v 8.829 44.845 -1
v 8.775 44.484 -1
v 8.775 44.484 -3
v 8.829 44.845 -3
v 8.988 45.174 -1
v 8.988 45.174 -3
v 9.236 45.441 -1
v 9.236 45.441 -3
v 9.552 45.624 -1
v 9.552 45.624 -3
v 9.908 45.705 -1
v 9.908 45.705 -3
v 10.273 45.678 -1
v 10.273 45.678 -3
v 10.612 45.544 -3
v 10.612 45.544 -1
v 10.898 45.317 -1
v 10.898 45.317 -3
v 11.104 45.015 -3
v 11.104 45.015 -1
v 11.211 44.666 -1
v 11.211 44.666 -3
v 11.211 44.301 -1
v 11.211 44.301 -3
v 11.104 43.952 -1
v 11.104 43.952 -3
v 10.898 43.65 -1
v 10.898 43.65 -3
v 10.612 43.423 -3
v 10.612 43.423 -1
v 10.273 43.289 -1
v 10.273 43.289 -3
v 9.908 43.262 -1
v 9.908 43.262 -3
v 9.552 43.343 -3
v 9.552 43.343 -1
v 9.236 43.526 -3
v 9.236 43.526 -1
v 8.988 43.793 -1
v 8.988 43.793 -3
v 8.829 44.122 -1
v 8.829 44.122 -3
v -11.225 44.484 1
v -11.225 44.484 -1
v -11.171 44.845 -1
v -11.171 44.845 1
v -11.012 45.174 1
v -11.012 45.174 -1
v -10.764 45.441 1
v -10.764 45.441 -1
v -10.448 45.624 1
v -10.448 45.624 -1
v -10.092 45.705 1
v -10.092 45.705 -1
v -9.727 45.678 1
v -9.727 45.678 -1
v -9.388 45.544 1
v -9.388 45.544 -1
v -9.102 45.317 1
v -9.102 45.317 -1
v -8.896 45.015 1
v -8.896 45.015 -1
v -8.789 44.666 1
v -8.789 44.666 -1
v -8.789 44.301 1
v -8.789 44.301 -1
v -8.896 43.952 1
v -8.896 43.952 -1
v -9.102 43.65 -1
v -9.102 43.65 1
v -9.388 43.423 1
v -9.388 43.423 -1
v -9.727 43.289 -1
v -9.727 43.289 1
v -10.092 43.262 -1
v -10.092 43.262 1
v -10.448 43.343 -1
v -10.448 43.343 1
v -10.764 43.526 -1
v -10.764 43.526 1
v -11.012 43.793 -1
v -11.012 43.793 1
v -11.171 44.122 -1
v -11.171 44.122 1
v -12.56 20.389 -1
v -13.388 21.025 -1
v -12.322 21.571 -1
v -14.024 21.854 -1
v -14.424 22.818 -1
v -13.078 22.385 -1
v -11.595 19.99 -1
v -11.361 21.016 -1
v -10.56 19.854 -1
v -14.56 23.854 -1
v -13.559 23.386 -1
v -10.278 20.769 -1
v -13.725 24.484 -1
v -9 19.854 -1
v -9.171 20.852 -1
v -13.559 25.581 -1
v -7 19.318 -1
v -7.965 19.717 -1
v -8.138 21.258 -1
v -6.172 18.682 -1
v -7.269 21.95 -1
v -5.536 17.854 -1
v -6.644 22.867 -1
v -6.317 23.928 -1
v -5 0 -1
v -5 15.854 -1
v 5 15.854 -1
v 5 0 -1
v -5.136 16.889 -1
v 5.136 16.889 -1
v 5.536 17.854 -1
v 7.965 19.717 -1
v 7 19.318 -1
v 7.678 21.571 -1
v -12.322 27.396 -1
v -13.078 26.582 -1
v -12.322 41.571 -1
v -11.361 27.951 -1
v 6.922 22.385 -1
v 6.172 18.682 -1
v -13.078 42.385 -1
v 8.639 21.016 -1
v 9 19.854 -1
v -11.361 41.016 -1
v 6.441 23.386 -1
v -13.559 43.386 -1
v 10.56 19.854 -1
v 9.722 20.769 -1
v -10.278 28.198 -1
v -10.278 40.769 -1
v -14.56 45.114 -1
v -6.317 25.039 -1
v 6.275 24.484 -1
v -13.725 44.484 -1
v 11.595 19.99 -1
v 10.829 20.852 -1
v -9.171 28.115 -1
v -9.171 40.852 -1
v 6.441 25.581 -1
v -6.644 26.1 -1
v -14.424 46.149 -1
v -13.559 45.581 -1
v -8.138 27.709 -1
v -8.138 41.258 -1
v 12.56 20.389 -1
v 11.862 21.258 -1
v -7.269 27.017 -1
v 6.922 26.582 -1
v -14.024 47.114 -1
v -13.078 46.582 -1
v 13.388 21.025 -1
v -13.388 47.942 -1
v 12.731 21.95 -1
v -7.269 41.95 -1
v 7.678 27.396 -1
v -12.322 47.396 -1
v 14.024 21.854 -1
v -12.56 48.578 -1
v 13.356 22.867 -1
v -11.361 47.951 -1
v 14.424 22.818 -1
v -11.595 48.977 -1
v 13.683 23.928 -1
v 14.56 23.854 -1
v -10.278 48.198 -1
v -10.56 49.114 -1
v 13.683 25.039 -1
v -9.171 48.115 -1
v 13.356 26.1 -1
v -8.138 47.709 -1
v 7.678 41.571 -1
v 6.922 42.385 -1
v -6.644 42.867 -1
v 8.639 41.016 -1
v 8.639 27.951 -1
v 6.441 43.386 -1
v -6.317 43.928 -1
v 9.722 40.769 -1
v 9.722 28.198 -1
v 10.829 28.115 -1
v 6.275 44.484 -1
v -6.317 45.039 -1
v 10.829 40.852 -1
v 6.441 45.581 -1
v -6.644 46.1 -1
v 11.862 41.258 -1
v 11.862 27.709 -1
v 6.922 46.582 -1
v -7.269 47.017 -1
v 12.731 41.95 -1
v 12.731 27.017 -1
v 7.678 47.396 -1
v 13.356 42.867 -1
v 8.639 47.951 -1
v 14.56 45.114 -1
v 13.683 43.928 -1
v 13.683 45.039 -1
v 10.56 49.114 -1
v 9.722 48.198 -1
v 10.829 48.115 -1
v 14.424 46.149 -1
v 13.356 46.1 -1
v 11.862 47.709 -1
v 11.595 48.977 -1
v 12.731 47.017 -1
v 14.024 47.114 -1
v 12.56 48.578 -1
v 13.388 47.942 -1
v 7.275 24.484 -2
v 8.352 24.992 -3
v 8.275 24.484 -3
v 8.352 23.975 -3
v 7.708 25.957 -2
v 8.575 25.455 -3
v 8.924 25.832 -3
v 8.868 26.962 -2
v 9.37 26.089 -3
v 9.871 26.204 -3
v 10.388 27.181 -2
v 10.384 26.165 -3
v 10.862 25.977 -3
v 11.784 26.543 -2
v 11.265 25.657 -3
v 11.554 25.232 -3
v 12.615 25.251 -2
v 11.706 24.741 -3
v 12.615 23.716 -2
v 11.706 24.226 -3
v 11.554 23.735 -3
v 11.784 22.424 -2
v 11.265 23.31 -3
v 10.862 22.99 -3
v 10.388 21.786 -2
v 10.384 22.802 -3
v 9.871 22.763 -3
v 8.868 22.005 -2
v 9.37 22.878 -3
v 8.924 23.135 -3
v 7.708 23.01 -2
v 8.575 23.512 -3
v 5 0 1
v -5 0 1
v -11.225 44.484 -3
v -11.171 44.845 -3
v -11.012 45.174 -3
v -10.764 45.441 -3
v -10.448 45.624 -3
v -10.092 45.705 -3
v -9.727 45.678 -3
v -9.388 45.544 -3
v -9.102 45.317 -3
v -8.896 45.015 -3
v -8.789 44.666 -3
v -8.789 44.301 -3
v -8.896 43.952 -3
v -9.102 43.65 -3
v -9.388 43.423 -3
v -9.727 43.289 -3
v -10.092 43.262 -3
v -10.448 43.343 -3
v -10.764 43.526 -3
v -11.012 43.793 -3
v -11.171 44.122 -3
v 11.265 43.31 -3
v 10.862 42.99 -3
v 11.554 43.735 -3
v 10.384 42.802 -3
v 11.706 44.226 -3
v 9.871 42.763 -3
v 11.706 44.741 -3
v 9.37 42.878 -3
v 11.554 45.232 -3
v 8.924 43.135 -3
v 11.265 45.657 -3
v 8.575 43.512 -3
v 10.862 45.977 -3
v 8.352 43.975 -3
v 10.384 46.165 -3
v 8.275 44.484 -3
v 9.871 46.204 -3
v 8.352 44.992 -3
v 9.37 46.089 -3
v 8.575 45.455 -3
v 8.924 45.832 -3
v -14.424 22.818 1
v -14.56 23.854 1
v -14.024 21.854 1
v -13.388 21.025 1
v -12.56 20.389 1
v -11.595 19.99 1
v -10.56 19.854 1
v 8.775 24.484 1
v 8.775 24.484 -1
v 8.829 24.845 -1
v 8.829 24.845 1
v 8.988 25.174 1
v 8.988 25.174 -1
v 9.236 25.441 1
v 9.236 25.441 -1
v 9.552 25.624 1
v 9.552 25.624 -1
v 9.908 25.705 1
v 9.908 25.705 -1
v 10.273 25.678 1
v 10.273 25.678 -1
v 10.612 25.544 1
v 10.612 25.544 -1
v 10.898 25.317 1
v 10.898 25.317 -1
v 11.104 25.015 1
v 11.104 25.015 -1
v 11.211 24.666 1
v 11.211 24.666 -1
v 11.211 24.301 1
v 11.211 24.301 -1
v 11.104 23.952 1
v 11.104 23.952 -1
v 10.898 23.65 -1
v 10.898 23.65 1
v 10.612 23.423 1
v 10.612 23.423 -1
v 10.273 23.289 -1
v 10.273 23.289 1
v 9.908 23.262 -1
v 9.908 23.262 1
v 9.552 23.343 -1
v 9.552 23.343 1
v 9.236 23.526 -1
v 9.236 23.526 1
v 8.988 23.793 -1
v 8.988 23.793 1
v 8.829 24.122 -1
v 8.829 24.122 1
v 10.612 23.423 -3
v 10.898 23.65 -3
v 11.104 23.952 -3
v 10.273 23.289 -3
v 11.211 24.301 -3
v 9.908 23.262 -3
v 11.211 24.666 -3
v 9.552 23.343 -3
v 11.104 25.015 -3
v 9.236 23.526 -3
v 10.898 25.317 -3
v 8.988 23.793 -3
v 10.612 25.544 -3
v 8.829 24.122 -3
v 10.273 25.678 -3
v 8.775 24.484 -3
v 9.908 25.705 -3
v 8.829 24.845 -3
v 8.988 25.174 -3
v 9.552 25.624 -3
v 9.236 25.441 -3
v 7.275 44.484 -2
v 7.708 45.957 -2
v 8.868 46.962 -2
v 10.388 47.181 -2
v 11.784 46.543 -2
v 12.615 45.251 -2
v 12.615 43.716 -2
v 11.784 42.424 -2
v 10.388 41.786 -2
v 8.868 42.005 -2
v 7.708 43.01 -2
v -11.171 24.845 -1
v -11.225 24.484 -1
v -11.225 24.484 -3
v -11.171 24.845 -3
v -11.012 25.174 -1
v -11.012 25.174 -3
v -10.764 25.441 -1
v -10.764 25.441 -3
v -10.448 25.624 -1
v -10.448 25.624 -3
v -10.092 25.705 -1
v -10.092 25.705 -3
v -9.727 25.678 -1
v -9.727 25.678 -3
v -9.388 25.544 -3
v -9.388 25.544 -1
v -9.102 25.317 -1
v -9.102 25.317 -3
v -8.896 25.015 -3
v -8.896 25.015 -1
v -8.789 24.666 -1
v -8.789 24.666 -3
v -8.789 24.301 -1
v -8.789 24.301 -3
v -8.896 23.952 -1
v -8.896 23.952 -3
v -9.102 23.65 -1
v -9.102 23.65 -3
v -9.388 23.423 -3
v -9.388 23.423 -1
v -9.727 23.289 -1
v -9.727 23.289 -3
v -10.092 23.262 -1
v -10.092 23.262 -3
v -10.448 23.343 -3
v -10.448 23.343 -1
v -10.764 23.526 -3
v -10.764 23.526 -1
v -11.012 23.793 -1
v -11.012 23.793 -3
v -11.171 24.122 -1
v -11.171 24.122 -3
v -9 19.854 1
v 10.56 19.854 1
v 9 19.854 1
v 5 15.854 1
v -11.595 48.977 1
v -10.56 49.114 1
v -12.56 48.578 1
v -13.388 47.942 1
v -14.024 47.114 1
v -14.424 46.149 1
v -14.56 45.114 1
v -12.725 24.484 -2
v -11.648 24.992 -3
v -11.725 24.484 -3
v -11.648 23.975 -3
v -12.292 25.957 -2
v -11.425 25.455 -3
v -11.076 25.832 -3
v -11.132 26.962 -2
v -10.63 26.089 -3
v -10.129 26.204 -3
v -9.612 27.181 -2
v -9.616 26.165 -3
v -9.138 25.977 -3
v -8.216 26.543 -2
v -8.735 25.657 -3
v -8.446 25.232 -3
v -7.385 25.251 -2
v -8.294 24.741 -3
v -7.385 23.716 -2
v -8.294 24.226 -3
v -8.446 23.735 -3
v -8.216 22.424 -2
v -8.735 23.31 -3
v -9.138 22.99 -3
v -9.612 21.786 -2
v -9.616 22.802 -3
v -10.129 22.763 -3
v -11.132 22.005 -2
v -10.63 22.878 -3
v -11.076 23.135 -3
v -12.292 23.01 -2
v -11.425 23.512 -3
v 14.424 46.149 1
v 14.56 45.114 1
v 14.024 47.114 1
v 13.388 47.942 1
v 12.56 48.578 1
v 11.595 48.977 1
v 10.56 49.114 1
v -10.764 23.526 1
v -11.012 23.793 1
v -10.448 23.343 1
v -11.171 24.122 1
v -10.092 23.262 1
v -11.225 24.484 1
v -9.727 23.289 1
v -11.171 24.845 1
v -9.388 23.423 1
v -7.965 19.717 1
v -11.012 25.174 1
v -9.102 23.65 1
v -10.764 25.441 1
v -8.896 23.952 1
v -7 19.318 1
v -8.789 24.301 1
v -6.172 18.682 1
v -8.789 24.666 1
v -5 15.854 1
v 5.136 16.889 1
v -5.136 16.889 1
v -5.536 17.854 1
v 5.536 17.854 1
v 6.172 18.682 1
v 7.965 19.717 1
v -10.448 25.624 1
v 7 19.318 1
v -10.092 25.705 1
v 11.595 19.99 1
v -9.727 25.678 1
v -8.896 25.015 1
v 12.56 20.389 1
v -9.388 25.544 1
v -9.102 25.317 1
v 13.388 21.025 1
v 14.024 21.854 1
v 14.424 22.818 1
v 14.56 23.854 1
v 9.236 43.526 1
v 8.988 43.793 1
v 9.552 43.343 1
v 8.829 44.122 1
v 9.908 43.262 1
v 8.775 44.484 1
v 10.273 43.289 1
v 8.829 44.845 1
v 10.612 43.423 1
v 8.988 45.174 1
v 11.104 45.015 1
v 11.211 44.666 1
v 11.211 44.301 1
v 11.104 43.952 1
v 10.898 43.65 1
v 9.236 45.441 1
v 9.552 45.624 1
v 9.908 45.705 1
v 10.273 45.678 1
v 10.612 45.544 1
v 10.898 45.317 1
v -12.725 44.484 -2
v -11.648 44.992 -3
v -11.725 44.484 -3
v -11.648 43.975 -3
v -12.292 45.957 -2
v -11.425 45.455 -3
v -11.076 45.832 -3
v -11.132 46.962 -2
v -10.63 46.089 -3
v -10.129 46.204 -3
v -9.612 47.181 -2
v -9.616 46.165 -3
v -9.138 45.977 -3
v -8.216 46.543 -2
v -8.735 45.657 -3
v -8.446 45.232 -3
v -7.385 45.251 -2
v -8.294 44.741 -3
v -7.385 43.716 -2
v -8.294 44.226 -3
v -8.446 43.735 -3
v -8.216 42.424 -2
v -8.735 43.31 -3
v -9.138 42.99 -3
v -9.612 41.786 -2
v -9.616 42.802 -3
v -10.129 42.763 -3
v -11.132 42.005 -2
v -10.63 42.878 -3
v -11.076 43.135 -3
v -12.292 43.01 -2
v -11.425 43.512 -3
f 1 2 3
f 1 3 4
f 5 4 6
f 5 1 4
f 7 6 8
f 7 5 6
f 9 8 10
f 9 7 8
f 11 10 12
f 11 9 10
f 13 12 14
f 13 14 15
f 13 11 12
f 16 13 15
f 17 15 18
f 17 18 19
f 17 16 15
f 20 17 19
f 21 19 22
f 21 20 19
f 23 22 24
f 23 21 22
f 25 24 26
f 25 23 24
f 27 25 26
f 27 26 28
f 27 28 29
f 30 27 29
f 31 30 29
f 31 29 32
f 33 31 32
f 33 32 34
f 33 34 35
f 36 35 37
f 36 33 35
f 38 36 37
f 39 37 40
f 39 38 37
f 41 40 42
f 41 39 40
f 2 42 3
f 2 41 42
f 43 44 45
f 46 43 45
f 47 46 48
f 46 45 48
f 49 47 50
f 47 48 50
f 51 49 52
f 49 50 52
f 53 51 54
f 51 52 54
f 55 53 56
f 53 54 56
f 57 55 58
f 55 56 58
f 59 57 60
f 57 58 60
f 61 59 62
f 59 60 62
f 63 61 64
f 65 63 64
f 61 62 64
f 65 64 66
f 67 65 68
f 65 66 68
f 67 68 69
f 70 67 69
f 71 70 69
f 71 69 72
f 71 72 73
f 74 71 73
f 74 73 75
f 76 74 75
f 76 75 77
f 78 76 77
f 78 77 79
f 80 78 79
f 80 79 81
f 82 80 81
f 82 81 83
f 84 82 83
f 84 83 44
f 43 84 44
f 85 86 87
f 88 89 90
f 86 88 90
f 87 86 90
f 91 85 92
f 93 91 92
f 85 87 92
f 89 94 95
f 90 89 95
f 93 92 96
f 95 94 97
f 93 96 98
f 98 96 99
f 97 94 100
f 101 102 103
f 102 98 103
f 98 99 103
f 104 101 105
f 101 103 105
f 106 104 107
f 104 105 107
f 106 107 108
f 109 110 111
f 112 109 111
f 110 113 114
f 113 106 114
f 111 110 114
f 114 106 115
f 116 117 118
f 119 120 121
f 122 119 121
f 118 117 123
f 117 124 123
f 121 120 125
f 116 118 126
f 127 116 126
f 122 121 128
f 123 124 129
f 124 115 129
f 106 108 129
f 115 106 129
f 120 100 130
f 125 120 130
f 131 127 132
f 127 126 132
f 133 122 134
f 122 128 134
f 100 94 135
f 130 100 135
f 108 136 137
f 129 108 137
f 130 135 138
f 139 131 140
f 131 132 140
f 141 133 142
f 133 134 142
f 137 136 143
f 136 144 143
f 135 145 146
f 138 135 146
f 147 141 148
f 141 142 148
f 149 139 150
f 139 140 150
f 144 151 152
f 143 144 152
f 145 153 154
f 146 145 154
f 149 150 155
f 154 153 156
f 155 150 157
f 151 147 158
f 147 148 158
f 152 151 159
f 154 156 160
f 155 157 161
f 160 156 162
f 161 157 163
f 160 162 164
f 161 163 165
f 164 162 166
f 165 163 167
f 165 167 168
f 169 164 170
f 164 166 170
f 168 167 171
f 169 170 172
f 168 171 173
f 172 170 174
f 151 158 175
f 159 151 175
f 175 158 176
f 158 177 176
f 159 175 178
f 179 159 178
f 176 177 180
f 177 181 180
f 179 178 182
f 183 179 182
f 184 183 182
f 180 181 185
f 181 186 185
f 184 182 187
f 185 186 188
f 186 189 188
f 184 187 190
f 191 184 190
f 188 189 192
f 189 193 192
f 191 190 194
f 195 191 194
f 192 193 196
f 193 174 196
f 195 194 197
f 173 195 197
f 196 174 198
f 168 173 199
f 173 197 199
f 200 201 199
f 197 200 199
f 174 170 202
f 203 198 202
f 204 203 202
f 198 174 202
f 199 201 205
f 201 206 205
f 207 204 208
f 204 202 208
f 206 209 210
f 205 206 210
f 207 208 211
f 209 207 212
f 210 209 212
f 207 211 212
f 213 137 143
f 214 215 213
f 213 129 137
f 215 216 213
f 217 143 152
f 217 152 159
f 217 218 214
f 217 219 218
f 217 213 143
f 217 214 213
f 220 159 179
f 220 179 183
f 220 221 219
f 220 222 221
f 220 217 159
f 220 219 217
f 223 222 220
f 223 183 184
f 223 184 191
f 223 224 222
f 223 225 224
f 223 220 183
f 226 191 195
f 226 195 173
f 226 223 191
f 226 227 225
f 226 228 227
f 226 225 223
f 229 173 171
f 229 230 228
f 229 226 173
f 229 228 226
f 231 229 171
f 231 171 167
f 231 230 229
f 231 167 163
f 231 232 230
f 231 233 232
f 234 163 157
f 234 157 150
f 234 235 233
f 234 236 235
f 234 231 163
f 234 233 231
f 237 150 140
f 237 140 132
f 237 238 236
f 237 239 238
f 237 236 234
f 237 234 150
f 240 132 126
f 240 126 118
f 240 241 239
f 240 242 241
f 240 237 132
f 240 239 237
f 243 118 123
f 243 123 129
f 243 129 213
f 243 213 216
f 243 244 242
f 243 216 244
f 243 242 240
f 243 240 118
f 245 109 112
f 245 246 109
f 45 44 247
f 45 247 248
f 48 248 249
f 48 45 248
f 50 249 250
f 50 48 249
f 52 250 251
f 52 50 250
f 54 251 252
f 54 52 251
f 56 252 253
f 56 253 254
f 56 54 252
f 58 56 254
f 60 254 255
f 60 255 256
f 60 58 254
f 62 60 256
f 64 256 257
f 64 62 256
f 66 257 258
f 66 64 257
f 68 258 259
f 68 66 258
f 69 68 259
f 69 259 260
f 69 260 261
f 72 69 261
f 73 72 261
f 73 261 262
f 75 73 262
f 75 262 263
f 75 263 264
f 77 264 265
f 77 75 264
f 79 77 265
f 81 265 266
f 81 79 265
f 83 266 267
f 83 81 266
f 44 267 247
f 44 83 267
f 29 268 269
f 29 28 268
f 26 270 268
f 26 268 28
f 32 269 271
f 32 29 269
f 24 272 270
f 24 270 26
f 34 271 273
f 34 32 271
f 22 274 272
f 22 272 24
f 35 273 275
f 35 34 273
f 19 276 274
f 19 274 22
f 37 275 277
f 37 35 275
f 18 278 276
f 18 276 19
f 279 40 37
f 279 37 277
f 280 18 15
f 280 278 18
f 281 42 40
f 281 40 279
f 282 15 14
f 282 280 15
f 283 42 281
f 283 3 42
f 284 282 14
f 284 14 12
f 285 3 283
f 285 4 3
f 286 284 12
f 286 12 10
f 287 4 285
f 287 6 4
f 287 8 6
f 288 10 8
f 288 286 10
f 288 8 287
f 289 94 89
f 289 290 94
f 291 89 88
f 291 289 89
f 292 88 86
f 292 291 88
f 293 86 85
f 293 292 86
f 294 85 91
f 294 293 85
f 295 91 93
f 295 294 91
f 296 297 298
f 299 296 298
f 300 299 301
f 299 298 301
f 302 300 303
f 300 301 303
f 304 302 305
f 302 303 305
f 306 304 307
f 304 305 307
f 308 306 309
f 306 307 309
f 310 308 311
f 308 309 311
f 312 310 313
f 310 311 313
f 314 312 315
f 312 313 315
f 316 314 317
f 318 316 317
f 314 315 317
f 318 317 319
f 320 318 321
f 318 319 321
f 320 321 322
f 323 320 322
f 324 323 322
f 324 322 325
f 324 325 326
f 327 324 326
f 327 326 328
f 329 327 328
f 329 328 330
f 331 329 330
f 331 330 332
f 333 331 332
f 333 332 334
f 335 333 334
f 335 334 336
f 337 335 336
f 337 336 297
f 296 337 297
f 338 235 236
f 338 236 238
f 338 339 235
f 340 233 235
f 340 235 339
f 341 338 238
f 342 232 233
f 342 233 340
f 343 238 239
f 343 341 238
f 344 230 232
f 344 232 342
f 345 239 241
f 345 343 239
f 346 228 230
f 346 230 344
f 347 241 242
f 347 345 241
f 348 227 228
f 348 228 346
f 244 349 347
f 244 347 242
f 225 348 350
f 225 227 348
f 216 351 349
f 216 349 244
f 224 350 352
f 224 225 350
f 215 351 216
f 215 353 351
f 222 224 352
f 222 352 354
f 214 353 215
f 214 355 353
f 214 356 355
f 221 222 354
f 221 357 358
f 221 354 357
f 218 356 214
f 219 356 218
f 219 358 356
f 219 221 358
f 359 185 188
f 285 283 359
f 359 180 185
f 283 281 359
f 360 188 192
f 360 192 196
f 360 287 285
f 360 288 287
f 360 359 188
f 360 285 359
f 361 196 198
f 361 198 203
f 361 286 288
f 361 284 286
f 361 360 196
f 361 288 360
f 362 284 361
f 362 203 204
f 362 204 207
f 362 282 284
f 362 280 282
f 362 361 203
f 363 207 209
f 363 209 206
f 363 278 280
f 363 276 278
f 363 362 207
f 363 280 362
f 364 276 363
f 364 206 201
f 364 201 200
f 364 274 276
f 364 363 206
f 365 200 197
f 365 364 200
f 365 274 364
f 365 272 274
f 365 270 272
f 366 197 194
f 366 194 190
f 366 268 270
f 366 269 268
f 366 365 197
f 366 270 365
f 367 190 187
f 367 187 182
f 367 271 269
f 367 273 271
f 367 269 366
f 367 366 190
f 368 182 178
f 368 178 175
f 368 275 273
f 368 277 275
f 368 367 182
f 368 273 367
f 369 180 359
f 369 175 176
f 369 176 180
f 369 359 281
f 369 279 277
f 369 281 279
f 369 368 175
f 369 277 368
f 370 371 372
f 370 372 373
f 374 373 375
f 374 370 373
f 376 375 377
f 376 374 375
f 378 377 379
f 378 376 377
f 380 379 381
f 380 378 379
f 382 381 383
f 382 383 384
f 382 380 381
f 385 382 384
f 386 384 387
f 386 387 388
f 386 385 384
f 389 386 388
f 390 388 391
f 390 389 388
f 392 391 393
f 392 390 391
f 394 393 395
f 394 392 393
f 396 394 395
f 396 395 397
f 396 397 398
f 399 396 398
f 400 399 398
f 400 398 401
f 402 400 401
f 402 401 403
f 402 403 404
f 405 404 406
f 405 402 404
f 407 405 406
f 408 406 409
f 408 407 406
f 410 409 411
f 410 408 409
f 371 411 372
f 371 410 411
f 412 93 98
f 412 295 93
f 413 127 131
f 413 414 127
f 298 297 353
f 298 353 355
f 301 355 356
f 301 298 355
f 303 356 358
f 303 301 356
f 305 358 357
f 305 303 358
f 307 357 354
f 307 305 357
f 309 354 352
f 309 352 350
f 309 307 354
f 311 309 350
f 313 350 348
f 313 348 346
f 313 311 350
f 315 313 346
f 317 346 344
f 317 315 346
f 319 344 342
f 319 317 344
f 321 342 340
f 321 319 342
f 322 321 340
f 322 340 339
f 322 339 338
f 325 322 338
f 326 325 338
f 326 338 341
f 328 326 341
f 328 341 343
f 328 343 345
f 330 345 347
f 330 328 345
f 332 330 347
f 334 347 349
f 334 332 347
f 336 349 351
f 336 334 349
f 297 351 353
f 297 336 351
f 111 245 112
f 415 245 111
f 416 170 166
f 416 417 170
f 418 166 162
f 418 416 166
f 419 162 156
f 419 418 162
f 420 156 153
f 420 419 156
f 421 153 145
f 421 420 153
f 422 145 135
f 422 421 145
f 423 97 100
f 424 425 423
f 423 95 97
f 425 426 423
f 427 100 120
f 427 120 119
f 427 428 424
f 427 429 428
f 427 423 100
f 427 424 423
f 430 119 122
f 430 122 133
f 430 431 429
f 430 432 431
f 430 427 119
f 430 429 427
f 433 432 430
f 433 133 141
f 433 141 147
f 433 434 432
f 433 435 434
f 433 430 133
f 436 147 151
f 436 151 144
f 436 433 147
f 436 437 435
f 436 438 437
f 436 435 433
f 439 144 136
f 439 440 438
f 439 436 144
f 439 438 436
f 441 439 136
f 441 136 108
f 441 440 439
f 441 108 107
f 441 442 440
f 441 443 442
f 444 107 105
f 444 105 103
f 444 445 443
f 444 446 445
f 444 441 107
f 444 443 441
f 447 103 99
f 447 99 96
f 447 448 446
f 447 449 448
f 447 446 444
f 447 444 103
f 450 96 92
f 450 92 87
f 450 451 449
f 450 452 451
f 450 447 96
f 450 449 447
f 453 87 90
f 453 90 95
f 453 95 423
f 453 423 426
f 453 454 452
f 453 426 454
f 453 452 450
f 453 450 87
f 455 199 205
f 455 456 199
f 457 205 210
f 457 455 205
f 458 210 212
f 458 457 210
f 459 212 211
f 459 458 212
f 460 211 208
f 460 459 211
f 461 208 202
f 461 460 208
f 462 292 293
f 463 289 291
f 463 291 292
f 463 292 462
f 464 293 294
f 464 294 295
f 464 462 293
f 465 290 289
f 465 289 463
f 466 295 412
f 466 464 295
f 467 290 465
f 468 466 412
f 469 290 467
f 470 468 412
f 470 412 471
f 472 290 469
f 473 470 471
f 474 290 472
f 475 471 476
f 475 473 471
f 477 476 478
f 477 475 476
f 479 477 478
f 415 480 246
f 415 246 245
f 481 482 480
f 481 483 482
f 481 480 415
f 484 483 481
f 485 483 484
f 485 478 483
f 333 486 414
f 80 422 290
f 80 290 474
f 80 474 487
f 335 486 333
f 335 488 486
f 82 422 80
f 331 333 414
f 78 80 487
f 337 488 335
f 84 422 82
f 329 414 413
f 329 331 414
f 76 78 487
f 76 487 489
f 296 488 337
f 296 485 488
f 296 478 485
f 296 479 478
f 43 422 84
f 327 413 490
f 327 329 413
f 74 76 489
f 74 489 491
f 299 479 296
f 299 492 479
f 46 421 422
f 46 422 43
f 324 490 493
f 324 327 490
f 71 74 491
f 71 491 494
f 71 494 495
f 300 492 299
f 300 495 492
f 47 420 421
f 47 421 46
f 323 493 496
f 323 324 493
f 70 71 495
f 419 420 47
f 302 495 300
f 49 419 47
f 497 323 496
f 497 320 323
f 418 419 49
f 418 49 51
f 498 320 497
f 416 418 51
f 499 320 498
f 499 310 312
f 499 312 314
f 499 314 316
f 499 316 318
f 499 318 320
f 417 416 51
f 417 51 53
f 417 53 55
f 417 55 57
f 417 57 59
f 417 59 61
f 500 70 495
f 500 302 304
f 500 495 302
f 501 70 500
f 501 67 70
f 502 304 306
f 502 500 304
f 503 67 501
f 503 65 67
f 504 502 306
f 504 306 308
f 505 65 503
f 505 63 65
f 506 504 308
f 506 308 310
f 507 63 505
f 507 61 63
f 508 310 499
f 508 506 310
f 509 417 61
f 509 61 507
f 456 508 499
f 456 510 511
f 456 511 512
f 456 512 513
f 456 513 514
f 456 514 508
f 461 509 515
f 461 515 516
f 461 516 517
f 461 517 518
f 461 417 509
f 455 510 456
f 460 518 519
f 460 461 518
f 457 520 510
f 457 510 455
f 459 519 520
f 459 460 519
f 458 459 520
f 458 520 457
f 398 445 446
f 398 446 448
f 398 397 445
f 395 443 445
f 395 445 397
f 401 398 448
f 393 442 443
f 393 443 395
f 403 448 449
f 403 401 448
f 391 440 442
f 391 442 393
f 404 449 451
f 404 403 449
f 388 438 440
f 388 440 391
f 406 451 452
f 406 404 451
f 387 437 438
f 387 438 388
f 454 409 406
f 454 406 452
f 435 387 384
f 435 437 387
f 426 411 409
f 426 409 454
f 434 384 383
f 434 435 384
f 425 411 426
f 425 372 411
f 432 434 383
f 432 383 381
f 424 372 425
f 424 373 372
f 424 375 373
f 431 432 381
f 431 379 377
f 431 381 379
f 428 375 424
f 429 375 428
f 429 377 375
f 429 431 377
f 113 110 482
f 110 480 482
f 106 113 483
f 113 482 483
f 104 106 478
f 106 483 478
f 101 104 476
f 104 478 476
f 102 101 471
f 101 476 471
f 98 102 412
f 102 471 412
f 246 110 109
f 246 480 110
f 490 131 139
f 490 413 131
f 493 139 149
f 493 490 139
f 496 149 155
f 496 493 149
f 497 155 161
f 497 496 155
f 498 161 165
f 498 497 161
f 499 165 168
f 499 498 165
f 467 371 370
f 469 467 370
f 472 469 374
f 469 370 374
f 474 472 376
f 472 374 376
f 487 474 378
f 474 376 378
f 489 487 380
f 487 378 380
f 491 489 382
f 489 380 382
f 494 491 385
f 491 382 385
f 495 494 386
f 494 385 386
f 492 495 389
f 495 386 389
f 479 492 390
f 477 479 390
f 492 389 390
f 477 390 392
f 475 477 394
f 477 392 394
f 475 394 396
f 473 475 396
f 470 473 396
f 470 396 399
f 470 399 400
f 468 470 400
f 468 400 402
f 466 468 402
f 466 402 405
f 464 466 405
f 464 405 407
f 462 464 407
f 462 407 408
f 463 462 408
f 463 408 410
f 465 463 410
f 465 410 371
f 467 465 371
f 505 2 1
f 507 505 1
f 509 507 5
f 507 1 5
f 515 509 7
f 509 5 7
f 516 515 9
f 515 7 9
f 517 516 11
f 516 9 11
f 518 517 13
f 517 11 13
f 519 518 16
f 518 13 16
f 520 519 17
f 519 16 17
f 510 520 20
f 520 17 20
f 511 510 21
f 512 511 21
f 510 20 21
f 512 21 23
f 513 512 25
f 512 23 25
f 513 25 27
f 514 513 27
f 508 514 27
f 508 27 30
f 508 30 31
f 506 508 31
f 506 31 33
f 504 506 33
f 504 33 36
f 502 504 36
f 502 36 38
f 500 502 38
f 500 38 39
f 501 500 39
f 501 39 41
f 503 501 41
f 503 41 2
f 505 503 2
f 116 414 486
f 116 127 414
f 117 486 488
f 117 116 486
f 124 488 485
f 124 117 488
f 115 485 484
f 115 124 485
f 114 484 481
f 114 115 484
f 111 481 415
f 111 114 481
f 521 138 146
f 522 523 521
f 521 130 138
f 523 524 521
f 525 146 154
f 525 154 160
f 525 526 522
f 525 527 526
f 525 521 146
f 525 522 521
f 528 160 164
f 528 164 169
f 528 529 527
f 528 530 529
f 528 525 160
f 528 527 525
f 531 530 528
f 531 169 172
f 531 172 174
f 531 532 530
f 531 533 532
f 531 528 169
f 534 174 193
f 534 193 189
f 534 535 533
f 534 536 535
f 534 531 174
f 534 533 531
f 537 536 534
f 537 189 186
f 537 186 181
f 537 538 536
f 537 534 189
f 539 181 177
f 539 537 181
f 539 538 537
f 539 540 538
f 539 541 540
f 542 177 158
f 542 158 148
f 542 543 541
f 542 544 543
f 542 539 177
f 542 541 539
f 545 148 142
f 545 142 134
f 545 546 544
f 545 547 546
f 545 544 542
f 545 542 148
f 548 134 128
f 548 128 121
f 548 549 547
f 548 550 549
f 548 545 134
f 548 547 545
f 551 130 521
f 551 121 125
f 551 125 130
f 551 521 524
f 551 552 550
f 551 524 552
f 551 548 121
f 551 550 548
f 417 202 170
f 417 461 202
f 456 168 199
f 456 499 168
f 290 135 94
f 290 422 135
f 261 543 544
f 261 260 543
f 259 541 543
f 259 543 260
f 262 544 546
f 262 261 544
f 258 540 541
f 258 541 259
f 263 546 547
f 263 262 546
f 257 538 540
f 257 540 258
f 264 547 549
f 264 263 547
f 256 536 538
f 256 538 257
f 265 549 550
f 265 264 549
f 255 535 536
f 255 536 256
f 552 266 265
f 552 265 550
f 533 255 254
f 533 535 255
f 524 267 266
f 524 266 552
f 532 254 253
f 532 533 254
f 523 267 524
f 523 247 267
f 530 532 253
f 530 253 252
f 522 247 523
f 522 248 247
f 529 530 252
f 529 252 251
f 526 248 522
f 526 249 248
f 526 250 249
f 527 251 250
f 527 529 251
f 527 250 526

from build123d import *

# Parameters (mm, degrees)
BOSS_EXTRUDE1_DEPTH = 1
SKETCH4_R           = 1.725
SKETCH4_R_2         = 1.225
BOSS_EXTRUDE2_DEPTH = 2
CHAMFER1_SIZE       = 2
FILLET1_R           = 4
CUT_EXTRUDE1_REACH  = 53.265
SKETCH4_2_R         = 1.225


with BuildPart() as part:
    # Sketch3 → Boss-Extrude1 (new, symmetric)
    with BuildSketch(Plane.XY):
        Polygon((5, 19.853558876), (14.56, 19.853558876), (14.56, 49.113558876), (-14.56, 49.113558876), (-14.56, 19.853558876), (-5, 19.853558876), (-5, 0), (5, 0), align=None)
    extrude(amount=BOSS_EXTRUDE1_DEPTH, both=True)

    # Sketch4 → Boss-Extrude2 (add)
    # profile 1 of 4: a face of its own
    with BuildSketch(Plane(origin=(0, 0, -1), x_dir=(-1, 0, 0), z_dir=(0, 0, -1))):
        with Locations((-10, 44.483558876)):
            Circle(SKETCH4_R)
        with Locations((-10, 44.483558876)):
            Circle(SKETCH4_R_2, mode=Mode.SUBTRACT)
    # profile 2 of 4: a face of its own
    with BuildSketch(Plane(origin=(0, 0, -1), x_dir=(-1, 0, 0), z_dir=(0, 0, -1))):
        with Locations((10, 44.483558876)):
            Circle(SKETCH4_R)
        with Locations((10, 44.483558876)):
            Circle(SKETCH4_R_2, mode=Mode.SUBTRACT)
    # profile 3 of 4: a face of its own
    with BuildSketch(Plane(origin=(0, 0, -1), x_dir=(-1, 0, 0), z_dir=(0, 0, -1))):
        with Locations((-10, 24.483558876)):
            Circle(SKETCH4_R)
        with Locations((-10, 24.483558876)):
            Circle(SKETCH4_R_2, mode=Mode.SUBTRACT)
    # profile 4 of 4: a face of its own
    with BuildSketch(Plane(origin=(0, 0, -1), x_dir=(-1, 0, 0), z_dir=(0, 0, -1))):
        with Locations((10, 24.483558876)):
            Circle(SKETCH4_R)
        with Locations((10, 24.483558876)):
            Circle(SKETCH4_R_2, mode=Mode.SUBTRACT)
    extrude(amount=BOSS_EXTRUDE2_DEPTH)

    # Chamfer1
    chamfer1_edges = [part.edges().sort_by_distance(p)[0] for p in [
        (11.725, 44.483558876, -1),
        (-8.275, 44.483558876, -1),
        (11.725, 24.483558876, -1),
        (-8.275, 24.483558876, -1),
    ]]
    chamfer(chamfer1_edges, length=CHAMFER1_SIZE - 0.0001)  # a hair under: the kernel refuses the full size

    # Fillet1
    fillet1_edges = [part.edges().sort_by_distance(p)[0] for p in [
        (-5, 19.853558876, 0),
        (-14.56, 19.853558876, 0),
        (-14.56, 49.113558876, 0),
        (14.56, 49.113558876, 0),
        (14.56, 19.853558876, 0),
        (5, 19.853558876, 0),
    ]]
    fillet(fillet1_edges, radius=FILLET1_R)

    # Sketch4<2> → Cut-Extrude1 (cut, up to next)
    with BuildSketch(Plane(origin=(0, 0, -1), x_dir=(-1, 0, 0), z_dir=(0, 0, -1)), mode=Mode.PRIVATE) as cut_extrude1_sk1:
        with Locations((-10, 44.483558876)):
            Circle(SKETCH4_2_R)
    cut_extrude1_tool1 = extrude(cut_extrude1_sk1.sketch, amount=-CUT_EXTRUDE1_REACH, mode=Mode.PRIVATE) & part.part
    # Sketch4<2> → Cut-Extrude1 (cut, up to next)
    with BuildSketch(Plane(origin=(0, 0, -1), x_dir=(-1, 0, 0), z_dir=(0, 0, -1)), mode=Mode.PRIVATE) as cut_extrude1_sk2:
        with Locations((10, 44.483558876)):
            Circle(SKETCH4_2_R)
    cut_extrude1_tool2 = extrude(cut_extrude1_sk2.sketch, amount=-CUT_EXTRUDE1_REACH, mode=Mode.PRIVATE) & part.part
    # Sketch4<2> → Cut-Extrude1 (cut, up to next)
    with BuildSketch(Plane(origin=(0, 0, -1), x_dir=(-1, 0, 0), z_dir=(0, 0, -1)), mode=Mode.PRIVATE) as cut_extrude1_sk3:
        with Locations((10, 24.483558876)):
            Circle(SKETCH4_2_R)
    cut_extrude1_tool3 = extrude(cut_extrude1_sk3.sketch, amount=-CUT_EXTRUDE1_REACH, mode=Mode.PRIVATE) & part.part
    # Sketch4<2> → Cut-Extrude1 (cut, up to next)
    with BuildSketch(Plane(origin=(0, 0, -1), x_dir=(-1, 0, 0), z_dir=(0, 0, -1)), mode=Mode.PRIVATE) as cut_extrude1_sk4:
        with Locations((-10, 24.483558876)):
            Circle(SKETCH4_2_R)
    cut_extrude1_tool4 = extrude(cut_extrude1_sk4.sketch, amount=-CUT_EXTRUDE1_REACH, mode=Mode.PRIVATE) & part.part
    add(cut_extrude1_tool1.solids().sort_by_distance((10, 44.483559, -1))[0], mode=Mode.SUBTRACT)
    add(cut_extrude1_tool2.solids().sort_by_distance((-10, 44.483559, -1))[0], mode=Mode.SUBTRACT)
    add(cut_extrude1_tool3.solids().sort_by_distance((-10, 24.483559, -1))[0], mode=Mode.SUBTRACT)
    add(cut_extrude1_tool4.solids().sort_by_distance((10, 24.483559, -1))[0], mode=Mode.SUBTRACT)


solid = part.part
